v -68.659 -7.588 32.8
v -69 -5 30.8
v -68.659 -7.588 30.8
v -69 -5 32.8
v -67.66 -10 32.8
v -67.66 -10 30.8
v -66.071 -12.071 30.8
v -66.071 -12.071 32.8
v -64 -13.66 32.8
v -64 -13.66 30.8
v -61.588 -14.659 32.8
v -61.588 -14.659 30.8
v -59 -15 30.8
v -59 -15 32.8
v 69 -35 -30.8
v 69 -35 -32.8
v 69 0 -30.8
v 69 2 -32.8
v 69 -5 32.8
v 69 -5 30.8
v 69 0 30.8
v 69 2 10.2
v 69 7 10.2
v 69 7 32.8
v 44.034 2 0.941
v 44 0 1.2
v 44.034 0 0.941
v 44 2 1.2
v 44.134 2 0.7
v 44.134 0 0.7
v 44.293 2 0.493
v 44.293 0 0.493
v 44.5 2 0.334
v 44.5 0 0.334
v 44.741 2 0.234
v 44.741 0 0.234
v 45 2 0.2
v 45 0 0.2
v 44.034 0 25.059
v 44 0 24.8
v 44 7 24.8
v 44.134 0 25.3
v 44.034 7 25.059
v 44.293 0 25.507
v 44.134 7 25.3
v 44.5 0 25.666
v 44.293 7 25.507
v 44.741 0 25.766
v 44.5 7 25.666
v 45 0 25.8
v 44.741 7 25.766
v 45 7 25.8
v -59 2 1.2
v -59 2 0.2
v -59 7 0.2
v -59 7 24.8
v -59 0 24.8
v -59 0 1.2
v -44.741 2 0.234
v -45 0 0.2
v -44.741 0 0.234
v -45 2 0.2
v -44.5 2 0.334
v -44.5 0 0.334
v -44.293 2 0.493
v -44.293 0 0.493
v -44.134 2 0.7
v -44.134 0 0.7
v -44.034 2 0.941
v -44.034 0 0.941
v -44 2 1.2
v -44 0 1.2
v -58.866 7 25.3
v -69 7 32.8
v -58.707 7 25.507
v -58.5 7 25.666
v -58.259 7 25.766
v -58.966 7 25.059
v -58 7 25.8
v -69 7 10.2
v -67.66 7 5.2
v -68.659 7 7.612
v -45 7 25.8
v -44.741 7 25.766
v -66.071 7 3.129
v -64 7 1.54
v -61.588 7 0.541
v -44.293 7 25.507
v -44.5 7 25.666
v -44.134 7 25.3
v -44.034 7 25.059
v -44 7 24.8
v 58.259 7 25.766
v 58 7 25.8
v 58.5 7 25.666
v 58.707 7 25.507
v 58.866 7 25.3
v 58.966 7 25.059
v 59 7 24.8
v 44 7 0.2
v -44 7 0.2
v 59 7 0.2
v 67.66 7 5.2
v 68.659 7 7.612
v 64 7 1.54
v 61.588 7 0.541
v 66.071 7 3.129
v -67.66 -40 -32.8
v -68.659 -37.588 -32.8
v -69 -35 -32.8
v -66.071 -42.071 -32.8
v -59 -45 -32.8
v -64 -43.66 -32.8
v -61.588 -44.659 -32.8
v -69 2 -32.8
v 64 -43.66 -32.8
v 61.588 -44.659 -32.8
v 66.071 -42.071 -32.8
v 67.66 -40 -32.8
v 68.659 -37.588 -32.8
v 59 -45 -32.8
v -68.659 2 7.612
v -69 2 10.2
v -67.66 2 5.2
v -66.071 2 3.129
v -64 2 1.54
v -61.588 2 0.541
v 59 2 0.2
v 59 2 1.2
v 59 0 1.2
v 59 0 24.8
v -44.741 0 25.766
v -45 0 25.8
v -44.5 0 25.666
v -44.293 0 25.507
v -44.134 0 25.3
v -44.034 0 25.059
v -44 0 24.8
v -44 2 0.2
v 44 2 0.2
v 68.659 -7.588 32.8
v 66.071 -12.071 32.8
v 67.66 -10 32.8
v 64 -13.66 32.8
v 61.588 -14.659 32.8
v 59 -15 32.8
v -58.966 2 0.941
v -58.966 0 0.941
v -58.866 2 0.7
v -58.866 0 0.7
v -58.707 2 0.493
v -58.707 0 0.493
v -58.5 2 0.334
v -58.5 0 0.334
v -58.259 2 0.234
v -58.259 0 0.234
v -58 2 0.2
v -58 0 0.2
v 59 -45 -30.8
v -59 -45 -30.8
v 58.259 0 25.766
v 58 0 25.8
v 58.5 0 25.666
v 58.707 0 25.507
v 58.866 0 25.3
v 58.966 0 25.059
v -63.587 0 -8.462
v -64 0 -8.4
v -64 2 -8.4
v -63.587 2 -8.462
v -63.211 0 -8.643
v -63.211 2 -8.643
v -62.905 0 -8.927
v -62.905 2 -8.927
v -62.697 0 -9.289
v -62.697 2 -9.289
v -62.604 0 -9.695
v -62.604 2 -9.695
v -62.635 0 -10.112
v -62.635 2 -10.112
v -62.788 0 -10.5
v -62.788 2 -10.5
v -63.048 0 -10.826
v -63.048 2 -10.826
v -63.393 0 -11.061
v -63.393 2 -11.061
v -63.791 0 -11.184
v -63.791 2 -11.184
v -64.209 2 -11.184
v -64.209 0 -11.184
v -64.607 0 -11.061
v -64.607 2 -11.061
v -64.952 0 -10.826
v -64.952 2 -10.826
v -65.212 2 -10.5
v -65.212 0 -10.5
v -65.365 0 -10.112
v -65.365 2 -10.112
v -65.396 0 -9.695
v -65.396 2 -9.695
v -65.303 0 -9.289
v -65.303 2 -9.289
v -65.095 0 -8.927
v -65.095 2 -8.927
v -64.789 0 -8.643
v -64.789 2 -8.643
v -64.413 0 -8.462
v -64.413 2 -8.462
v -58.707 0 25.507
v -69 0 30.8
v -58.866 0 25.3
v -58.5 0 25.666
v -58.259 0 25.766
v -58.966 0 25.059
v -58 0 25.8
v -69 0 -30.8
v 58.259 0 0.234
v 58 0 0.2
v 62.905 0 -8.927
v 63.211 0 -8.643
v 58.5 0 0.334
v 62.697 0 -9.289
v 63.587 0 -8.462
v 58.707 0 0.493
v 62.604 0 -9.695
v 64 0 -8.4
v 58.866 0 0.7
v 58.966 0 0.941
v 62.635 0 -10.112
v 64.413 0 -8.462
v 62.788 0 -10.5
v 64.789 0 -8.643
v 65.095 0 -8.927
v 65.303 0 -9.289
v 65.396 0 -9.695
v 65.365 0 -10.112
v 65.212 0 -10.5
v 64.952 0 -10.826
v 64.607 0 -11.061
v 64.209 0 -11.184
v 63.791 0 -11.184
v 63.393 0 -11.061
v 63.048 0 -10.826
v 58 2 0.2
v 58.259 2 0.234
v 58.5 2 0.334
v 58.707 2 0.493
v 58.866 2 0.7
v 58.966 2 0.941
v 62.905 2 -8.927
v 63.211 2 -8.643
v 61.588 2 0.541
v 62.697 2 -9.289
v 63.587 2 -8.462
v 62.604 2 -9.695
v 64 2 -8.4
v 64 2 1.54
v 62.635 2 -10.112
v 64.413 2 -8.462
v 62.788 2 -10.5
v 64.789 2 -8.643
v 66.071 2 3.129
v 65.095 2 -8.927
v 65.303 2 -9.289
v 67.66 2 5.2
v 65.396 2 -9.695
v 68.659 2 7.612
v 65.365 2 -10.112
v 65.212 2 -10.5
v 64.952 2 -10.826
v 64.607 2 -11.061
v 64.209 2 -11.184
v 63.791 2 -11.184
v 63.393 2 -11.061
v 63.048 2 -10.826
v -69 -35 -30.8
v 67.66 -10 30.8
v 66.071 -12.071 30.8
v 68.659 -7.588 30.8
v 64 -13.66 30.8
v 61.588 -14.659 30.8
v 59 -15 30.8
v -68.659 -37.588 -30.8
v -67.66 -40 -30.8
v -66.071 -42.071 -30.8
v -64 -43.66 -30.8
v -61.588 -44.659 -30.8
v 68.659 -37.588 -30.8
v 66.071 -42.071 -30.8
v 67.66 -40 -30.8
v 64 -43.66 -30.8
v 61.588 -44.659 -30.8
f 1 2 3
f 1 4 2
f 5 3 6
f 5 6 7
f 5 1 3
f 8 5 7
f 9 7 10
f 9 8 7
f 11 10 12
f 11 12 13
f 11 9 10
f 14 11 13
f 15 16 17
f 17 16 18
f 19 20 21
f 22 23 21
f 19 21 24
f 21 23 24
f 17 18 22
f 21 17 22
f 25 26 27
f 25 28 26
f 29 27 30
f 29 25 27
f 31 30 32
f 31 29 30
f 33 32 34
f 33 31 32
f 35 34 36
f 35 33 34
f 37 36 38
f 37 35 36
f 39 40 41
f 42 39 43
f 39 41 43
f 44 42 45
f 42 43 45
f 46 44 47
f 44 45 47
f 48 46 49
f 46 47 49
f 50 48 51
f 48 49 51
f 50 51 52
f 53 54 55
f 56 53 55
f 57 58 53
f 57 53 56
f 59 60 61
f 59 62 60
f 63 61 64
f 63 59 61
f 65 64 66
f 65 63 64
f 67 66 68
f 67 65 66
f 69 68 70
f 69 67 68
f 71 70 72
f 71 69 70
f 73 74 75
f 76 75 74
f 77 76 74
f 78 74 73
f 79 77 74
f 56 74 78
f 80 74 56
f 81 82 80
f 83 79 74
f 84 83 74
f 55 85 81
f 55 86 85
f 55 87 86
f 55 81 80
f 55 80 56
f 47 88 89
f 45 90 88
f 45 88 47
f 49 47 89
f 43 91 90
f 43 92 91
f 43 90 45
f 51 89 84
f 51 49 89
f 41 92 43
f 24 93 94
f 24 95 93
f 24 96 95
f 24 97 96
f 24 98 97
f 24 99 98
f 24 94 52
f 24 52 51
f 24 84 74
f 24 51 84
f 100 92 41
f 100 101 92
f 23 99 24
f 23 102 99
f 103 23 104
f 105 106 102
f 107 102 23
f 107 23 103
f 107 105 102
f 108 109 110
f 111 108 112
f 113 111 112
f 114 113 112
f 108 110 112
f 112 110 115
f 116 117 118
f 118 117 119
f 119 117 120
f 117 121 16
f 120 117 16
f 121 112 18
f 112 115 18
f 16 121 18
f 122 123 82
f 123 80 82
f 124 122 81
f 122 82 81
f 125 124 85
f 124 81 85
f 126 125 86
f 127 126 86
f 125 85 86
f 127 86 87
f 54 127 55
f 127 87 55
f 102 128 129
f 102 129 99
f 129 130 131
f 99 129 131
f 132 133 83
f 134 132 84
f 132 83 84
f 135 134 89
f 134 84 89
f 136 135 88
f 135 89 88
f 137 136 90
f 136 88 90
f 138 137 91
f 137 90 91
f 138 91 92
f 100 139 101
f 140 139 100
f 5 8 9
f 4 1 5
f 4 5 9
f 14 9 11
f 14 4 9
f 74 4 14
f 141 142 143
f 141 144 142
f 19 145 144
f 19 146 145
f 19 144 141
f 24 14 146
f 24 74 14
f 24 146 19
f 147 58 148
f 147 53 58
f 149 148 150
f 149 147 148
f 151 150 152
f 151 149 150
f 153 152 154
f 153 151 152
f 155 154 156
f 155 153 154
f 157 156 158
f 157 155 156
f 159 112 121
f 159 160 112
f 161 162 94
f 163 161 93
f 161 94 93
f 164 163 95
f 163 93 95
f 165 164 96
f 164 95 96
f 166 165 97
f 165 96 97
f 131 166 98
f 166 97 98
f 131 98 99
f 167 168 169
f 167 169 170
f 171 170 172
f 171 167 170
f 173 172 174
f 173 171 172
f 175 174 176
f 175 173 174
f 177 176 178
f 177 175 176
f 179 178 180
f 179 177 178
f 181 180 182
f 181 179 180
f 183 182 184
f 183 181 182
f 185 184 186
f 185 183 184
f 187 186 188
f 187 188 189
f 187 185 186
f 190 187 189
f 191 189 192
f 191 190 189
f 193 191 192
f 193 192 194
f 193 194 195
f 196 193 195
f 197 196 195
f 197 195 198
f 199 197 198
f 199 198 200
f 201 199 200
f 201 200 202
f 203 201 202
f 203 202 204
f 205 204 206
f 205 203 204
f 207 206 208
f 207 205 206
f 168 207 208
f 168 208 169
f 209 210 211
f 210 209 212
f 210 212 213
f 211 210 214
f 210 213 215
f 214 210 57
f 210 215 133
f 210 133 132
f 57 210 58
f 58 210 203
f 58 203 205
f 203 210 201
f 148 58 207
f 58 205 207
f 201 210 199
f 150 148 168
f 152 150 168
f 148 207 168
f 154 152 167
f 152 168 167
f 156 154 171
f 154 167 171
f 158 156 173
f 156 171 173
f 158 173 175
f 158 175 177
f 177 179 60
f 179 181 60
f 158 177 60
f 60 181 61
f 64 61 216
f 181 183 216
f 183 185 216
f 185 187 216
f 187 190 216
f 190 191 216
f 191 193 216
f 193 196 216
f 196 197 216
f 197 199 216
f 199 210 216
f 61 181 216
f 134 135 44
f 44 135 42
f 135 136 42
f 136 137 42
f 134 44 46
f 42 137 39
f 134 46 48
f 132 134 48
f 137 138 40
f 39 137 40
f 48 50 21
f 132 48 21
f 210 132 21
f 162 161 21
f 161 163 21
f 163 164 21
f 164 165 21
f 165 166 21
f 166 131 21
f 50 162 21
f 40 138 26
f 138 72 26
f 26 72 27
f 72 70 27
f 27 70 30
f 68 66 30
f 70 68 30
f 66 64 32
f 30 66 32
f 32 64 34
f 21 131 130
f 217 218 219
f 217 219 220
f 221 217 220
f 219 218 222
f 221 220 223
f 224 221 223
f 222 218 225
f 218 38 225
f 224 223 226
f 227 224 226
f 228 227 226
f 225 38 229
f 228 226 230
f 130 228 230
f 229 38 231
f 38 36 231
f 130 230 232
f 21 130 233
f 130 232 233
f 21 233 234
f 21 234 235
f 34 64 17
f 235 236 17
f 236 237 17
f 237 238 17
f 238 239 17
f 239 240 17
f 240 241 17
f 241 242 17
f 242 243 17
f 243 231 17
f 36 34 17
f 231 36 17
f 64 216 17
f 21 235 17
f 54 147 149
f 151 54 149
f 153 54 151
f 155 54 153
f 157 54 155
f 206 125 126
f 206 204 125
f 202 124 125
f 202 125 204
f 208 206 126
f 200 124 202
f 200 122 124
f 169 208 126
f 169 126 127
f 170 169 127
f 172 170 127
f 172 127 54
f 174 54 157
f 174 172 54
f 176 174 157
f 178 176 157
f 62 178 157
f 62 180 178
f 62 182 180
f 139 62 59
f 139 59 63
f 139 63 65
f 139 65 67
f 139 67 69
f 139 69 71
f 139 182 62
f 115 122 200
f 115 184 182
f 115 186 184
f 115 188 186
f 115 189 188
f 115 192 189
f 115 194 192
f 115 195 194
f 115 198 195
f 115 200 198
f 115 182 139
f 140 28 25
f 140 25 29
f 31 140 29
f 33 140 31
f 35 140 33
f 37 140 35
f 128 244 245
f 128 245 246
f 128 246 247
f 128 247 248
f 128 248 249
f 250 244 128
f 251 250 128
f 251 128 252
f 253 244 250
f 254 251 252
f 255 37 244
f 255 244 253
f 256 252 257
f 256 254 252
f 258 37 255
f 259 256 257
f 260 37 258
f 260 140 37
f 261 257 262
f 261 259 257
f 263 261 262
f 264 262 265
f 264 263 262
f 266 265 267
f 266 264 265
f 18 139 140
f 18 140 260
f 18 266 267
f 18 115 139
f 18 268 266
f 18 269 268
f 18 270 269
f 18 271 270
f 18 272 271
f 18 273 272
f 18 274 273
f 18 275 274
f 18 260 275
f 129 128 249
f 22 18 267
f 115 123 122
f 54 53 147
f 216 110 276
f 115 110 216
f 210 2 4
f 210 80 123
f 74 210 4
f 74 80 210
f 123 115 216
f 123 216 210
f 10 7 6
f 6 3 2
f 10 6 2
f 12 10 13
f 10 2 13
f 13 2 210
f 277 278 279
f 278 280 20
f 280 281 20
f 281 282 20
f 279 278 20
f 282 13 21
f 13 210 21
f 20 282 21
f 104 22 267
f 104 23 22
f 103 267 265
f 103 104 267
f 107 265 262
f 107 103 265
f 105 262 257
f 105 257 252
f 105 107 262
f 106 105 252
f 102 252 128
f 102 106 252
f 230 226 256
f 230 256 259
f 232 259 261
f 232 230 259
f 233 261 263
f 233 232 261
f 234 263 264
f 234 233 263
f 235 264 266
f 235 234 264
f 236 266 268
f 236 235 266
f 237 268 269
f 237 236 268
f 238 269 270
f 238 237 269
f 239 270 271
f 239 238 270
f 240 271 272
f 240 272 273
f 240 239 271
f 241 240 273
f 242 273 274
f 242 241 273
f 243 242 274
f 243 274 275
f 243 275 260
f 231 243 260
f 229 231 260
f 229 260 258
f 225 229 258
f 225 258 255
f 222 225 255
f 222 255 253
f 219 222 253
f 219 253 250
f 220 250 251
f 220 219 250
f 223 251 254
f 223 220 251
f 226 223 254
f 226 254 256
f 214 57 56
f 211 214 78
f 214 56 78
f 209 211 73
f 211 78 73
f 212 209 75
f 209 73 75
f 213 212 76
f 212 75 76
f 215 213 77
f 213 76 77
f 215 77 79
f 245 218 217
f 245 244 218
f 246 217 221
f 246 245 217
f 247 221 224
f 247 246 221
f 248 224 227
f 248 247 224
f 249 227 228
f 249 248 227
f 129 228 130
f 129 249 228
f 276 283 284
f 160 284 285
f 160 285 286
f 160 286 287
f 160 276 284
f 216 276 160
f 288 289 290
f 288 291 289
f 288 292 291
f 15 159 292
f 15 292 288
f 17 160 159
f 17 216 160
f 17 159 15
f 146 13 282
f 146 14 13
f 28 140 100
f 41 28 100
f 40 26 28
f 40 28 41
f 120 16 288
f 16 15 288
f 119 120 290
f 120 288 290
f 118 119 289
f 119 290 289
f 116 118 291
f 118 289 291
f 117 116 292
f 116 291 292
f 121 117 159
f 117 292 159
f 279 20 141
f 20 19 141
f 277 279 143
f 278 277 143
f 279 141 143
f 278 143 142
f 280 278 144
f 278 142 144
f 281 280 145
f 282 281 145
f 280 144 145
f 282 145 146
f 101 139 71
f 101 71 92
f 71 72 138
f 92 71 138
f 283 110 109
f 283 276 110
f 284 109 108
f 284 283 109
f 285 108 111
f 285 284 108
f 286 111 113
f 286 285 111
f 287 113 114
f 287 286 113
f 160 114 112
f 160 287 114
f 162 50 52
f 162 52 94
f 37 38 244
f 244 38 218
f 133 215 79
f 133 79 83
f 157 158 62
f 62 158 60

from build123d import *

# Parameters (mm, degrees)
SKETCH_1_W          = 138
SKETCH_1_H          = 65.6
SKETCH_1_R          = 1.4
EXTRUDE_1_DEPTH     = 2
SKETCH_2_W          = 138
SKETCH_2_H          = 32.6
EXTRUDE_2_DEPTH     = 5
SKETCH_3_W          = 138
SKETCH_3_H          = 2
EXTRUDE_3_DEPTH     = 45
FILLET_1_R          = 10
SKETCH_5_W          = 138
SKETCH_5_H          = 2
EXTRUDE_4_DEPTH     = 15
FILLET_2_R          = 10
CUT_EXTRUDE_1_REACH = 90.667
SKETCH_6_W          = 15
SKETCH_6_H          = 25.6
FILLET_3_R          = 1
FILLET_4_R          = 1


with BuildPart() as part:
    # 草图1 → 凸台-拉伸1 (new body)
    with BuildSketch(Plane(origin=(0, 0, 0), x_dir=(1, 0, 0), z_dir=(0, 1, 0))):
        Rectangle(SKETCH_1_W, SKETCH_1_H)
        with Locations(Location((-64, 9.8, 0), (0, 0, 270))):
            Circle(SKETCH_1_R, mode=Mode.SUBTRACT)
        with Locations(Location((64, 9.8, 0), (0, 0, 270))):
            Circle(SKETCH_1_R, mode=Mode.SUBTRACT)
    extrude(amount=EXTRUDE_1_DEPTH)

    # 草图2 → 凸台-拉伸2 (add)
    with BuildSketch(Plane(origin=(0, 2, 0), x_dir=(1, 0, 0), z_dir=(0, 1, 0))):
        with Locations((0, -16.5)):
            Rectangle(SKETCH_2_W, SKETCH_2_H)
    extrude(amount=EXTRUDE_2_DEPTH)

    # 草图3 → 凸台-拉伸3 (add)
    with BuildSketch(Plane.XZ):
        with Locations((0, -31.8)):
            Rectangle(SKETCH_3_W, SKETCH_3_H)
    extrude(amount=EXTRUDE_3_DEPTH)

    # 圆角1
    fillet_1_edges = [part.edges().sort_by_distance(p)[0] for p in [
        (-69, 4.5, 0.2),
        (69, 4.5, 0.2),
    ]]
    fillet(fillet_1_edges, radius=FILLET_1_R)

    # 草图5 → 凸台-拉伸4 (add)
    with BuildSketch(Plane.XZ):
        with Locations((0, 31.8)):
            Rectangle(SKETCH_5_W, SKETCH_5_H)
    extrude(amount=EXTRUDE_4_DEPTH)

    # 圆角2
    fillet_2_edges = [part.edges().sort_by_distance(p)[0] for p in [
        (-69, -45, -31.8),
        (69, -45, -31.8),
        (-69, -15, 31.8),
        (69, -15, 31.8),
    ]]
    fillet(fillet_2_edges, radius=FILLET_2_R)

    # 切除-拉伸1: up to this face of the body (flat: up to its plane)
    cut_extrude_1_end = Plane(part.part.faces().sort_by_distance((0, 7, 16.635491013))[0])
    # 草图6 → 切除-拉伸1 (cut, up to the picked face)
    with BuildSketch(Plane.XZ, mode=Mode.PRIVATE) as cut_extrude_1_sk1:
        with Locations((-51.5, 13)):
            Rectangle(SKETCH_6_W, SKETCH_6_H)
    cut_extrude_1_tool1 = split(extrude(cut_extrude_1_sk1.sketch, amount=-CUT_EXTRUDE_1_REACH, mode=Mode.PRIVATE), bisect_by=cut_extrude_1_end, keep=Keep.BOTH, mode=Mode.PRIVATE)
    # 草图6 → 切除-拉伸1 (cut, up to the picked face)
    with BuildSketch(Plane.XZ, mode=Mode.PRIVATE) as cut_extrude_1_sk2:
        with Locations((51.5, 13)):
            Rectangle(SKETCH_6_W, SKETCH_6_H)
    cut_extrude_1_tool2 = split(extrude(cut_extrude_1_sk2.sketch, amount=-CUT_EXTRUDE_1_REACH, mode=Mode.PRIVATE), bisect_by=cut_extrude_1_end, keep=Keep.BOTH, mode=Mode.PRIVATE)
    add(cut_extrude_1_tool1.solids().sort_by(Axis((-51.5, 0, 13), (0, 1, 0)))[0], mode=Mode.SUBTRACT)
    add(cut_extrude_1_tool2.solids().sort_by(Axis((51.5, 0, 13), (0, 1, 0)))[0], mode=Mode.SUBTRACT)

    # 圆角3
    fillet_3_edges = [part.edges().sort_by_distance(p)[0] for p in [
        (-59, 3.5, 25.8),
        (-44, 3.5, 25.8),
        (59, 3.5, 25.8),
        (44, 3.5, 25.8),
    ]]
    fillet(fillet_3_edges, radius=FILLET_3_R)

    # 圆角4
    fillet_4_edges = [part.edges().sort_by_distance(p)[0] for p in [
        (-44, 1, 0.2),
        (-59, 1, 0.2),
        (59, 1, 0.2),
        (44, 1, 0.2),
    ]]
    fillet(fillet_4_edges, radius=FILLET_4_R)


solid = part.part
